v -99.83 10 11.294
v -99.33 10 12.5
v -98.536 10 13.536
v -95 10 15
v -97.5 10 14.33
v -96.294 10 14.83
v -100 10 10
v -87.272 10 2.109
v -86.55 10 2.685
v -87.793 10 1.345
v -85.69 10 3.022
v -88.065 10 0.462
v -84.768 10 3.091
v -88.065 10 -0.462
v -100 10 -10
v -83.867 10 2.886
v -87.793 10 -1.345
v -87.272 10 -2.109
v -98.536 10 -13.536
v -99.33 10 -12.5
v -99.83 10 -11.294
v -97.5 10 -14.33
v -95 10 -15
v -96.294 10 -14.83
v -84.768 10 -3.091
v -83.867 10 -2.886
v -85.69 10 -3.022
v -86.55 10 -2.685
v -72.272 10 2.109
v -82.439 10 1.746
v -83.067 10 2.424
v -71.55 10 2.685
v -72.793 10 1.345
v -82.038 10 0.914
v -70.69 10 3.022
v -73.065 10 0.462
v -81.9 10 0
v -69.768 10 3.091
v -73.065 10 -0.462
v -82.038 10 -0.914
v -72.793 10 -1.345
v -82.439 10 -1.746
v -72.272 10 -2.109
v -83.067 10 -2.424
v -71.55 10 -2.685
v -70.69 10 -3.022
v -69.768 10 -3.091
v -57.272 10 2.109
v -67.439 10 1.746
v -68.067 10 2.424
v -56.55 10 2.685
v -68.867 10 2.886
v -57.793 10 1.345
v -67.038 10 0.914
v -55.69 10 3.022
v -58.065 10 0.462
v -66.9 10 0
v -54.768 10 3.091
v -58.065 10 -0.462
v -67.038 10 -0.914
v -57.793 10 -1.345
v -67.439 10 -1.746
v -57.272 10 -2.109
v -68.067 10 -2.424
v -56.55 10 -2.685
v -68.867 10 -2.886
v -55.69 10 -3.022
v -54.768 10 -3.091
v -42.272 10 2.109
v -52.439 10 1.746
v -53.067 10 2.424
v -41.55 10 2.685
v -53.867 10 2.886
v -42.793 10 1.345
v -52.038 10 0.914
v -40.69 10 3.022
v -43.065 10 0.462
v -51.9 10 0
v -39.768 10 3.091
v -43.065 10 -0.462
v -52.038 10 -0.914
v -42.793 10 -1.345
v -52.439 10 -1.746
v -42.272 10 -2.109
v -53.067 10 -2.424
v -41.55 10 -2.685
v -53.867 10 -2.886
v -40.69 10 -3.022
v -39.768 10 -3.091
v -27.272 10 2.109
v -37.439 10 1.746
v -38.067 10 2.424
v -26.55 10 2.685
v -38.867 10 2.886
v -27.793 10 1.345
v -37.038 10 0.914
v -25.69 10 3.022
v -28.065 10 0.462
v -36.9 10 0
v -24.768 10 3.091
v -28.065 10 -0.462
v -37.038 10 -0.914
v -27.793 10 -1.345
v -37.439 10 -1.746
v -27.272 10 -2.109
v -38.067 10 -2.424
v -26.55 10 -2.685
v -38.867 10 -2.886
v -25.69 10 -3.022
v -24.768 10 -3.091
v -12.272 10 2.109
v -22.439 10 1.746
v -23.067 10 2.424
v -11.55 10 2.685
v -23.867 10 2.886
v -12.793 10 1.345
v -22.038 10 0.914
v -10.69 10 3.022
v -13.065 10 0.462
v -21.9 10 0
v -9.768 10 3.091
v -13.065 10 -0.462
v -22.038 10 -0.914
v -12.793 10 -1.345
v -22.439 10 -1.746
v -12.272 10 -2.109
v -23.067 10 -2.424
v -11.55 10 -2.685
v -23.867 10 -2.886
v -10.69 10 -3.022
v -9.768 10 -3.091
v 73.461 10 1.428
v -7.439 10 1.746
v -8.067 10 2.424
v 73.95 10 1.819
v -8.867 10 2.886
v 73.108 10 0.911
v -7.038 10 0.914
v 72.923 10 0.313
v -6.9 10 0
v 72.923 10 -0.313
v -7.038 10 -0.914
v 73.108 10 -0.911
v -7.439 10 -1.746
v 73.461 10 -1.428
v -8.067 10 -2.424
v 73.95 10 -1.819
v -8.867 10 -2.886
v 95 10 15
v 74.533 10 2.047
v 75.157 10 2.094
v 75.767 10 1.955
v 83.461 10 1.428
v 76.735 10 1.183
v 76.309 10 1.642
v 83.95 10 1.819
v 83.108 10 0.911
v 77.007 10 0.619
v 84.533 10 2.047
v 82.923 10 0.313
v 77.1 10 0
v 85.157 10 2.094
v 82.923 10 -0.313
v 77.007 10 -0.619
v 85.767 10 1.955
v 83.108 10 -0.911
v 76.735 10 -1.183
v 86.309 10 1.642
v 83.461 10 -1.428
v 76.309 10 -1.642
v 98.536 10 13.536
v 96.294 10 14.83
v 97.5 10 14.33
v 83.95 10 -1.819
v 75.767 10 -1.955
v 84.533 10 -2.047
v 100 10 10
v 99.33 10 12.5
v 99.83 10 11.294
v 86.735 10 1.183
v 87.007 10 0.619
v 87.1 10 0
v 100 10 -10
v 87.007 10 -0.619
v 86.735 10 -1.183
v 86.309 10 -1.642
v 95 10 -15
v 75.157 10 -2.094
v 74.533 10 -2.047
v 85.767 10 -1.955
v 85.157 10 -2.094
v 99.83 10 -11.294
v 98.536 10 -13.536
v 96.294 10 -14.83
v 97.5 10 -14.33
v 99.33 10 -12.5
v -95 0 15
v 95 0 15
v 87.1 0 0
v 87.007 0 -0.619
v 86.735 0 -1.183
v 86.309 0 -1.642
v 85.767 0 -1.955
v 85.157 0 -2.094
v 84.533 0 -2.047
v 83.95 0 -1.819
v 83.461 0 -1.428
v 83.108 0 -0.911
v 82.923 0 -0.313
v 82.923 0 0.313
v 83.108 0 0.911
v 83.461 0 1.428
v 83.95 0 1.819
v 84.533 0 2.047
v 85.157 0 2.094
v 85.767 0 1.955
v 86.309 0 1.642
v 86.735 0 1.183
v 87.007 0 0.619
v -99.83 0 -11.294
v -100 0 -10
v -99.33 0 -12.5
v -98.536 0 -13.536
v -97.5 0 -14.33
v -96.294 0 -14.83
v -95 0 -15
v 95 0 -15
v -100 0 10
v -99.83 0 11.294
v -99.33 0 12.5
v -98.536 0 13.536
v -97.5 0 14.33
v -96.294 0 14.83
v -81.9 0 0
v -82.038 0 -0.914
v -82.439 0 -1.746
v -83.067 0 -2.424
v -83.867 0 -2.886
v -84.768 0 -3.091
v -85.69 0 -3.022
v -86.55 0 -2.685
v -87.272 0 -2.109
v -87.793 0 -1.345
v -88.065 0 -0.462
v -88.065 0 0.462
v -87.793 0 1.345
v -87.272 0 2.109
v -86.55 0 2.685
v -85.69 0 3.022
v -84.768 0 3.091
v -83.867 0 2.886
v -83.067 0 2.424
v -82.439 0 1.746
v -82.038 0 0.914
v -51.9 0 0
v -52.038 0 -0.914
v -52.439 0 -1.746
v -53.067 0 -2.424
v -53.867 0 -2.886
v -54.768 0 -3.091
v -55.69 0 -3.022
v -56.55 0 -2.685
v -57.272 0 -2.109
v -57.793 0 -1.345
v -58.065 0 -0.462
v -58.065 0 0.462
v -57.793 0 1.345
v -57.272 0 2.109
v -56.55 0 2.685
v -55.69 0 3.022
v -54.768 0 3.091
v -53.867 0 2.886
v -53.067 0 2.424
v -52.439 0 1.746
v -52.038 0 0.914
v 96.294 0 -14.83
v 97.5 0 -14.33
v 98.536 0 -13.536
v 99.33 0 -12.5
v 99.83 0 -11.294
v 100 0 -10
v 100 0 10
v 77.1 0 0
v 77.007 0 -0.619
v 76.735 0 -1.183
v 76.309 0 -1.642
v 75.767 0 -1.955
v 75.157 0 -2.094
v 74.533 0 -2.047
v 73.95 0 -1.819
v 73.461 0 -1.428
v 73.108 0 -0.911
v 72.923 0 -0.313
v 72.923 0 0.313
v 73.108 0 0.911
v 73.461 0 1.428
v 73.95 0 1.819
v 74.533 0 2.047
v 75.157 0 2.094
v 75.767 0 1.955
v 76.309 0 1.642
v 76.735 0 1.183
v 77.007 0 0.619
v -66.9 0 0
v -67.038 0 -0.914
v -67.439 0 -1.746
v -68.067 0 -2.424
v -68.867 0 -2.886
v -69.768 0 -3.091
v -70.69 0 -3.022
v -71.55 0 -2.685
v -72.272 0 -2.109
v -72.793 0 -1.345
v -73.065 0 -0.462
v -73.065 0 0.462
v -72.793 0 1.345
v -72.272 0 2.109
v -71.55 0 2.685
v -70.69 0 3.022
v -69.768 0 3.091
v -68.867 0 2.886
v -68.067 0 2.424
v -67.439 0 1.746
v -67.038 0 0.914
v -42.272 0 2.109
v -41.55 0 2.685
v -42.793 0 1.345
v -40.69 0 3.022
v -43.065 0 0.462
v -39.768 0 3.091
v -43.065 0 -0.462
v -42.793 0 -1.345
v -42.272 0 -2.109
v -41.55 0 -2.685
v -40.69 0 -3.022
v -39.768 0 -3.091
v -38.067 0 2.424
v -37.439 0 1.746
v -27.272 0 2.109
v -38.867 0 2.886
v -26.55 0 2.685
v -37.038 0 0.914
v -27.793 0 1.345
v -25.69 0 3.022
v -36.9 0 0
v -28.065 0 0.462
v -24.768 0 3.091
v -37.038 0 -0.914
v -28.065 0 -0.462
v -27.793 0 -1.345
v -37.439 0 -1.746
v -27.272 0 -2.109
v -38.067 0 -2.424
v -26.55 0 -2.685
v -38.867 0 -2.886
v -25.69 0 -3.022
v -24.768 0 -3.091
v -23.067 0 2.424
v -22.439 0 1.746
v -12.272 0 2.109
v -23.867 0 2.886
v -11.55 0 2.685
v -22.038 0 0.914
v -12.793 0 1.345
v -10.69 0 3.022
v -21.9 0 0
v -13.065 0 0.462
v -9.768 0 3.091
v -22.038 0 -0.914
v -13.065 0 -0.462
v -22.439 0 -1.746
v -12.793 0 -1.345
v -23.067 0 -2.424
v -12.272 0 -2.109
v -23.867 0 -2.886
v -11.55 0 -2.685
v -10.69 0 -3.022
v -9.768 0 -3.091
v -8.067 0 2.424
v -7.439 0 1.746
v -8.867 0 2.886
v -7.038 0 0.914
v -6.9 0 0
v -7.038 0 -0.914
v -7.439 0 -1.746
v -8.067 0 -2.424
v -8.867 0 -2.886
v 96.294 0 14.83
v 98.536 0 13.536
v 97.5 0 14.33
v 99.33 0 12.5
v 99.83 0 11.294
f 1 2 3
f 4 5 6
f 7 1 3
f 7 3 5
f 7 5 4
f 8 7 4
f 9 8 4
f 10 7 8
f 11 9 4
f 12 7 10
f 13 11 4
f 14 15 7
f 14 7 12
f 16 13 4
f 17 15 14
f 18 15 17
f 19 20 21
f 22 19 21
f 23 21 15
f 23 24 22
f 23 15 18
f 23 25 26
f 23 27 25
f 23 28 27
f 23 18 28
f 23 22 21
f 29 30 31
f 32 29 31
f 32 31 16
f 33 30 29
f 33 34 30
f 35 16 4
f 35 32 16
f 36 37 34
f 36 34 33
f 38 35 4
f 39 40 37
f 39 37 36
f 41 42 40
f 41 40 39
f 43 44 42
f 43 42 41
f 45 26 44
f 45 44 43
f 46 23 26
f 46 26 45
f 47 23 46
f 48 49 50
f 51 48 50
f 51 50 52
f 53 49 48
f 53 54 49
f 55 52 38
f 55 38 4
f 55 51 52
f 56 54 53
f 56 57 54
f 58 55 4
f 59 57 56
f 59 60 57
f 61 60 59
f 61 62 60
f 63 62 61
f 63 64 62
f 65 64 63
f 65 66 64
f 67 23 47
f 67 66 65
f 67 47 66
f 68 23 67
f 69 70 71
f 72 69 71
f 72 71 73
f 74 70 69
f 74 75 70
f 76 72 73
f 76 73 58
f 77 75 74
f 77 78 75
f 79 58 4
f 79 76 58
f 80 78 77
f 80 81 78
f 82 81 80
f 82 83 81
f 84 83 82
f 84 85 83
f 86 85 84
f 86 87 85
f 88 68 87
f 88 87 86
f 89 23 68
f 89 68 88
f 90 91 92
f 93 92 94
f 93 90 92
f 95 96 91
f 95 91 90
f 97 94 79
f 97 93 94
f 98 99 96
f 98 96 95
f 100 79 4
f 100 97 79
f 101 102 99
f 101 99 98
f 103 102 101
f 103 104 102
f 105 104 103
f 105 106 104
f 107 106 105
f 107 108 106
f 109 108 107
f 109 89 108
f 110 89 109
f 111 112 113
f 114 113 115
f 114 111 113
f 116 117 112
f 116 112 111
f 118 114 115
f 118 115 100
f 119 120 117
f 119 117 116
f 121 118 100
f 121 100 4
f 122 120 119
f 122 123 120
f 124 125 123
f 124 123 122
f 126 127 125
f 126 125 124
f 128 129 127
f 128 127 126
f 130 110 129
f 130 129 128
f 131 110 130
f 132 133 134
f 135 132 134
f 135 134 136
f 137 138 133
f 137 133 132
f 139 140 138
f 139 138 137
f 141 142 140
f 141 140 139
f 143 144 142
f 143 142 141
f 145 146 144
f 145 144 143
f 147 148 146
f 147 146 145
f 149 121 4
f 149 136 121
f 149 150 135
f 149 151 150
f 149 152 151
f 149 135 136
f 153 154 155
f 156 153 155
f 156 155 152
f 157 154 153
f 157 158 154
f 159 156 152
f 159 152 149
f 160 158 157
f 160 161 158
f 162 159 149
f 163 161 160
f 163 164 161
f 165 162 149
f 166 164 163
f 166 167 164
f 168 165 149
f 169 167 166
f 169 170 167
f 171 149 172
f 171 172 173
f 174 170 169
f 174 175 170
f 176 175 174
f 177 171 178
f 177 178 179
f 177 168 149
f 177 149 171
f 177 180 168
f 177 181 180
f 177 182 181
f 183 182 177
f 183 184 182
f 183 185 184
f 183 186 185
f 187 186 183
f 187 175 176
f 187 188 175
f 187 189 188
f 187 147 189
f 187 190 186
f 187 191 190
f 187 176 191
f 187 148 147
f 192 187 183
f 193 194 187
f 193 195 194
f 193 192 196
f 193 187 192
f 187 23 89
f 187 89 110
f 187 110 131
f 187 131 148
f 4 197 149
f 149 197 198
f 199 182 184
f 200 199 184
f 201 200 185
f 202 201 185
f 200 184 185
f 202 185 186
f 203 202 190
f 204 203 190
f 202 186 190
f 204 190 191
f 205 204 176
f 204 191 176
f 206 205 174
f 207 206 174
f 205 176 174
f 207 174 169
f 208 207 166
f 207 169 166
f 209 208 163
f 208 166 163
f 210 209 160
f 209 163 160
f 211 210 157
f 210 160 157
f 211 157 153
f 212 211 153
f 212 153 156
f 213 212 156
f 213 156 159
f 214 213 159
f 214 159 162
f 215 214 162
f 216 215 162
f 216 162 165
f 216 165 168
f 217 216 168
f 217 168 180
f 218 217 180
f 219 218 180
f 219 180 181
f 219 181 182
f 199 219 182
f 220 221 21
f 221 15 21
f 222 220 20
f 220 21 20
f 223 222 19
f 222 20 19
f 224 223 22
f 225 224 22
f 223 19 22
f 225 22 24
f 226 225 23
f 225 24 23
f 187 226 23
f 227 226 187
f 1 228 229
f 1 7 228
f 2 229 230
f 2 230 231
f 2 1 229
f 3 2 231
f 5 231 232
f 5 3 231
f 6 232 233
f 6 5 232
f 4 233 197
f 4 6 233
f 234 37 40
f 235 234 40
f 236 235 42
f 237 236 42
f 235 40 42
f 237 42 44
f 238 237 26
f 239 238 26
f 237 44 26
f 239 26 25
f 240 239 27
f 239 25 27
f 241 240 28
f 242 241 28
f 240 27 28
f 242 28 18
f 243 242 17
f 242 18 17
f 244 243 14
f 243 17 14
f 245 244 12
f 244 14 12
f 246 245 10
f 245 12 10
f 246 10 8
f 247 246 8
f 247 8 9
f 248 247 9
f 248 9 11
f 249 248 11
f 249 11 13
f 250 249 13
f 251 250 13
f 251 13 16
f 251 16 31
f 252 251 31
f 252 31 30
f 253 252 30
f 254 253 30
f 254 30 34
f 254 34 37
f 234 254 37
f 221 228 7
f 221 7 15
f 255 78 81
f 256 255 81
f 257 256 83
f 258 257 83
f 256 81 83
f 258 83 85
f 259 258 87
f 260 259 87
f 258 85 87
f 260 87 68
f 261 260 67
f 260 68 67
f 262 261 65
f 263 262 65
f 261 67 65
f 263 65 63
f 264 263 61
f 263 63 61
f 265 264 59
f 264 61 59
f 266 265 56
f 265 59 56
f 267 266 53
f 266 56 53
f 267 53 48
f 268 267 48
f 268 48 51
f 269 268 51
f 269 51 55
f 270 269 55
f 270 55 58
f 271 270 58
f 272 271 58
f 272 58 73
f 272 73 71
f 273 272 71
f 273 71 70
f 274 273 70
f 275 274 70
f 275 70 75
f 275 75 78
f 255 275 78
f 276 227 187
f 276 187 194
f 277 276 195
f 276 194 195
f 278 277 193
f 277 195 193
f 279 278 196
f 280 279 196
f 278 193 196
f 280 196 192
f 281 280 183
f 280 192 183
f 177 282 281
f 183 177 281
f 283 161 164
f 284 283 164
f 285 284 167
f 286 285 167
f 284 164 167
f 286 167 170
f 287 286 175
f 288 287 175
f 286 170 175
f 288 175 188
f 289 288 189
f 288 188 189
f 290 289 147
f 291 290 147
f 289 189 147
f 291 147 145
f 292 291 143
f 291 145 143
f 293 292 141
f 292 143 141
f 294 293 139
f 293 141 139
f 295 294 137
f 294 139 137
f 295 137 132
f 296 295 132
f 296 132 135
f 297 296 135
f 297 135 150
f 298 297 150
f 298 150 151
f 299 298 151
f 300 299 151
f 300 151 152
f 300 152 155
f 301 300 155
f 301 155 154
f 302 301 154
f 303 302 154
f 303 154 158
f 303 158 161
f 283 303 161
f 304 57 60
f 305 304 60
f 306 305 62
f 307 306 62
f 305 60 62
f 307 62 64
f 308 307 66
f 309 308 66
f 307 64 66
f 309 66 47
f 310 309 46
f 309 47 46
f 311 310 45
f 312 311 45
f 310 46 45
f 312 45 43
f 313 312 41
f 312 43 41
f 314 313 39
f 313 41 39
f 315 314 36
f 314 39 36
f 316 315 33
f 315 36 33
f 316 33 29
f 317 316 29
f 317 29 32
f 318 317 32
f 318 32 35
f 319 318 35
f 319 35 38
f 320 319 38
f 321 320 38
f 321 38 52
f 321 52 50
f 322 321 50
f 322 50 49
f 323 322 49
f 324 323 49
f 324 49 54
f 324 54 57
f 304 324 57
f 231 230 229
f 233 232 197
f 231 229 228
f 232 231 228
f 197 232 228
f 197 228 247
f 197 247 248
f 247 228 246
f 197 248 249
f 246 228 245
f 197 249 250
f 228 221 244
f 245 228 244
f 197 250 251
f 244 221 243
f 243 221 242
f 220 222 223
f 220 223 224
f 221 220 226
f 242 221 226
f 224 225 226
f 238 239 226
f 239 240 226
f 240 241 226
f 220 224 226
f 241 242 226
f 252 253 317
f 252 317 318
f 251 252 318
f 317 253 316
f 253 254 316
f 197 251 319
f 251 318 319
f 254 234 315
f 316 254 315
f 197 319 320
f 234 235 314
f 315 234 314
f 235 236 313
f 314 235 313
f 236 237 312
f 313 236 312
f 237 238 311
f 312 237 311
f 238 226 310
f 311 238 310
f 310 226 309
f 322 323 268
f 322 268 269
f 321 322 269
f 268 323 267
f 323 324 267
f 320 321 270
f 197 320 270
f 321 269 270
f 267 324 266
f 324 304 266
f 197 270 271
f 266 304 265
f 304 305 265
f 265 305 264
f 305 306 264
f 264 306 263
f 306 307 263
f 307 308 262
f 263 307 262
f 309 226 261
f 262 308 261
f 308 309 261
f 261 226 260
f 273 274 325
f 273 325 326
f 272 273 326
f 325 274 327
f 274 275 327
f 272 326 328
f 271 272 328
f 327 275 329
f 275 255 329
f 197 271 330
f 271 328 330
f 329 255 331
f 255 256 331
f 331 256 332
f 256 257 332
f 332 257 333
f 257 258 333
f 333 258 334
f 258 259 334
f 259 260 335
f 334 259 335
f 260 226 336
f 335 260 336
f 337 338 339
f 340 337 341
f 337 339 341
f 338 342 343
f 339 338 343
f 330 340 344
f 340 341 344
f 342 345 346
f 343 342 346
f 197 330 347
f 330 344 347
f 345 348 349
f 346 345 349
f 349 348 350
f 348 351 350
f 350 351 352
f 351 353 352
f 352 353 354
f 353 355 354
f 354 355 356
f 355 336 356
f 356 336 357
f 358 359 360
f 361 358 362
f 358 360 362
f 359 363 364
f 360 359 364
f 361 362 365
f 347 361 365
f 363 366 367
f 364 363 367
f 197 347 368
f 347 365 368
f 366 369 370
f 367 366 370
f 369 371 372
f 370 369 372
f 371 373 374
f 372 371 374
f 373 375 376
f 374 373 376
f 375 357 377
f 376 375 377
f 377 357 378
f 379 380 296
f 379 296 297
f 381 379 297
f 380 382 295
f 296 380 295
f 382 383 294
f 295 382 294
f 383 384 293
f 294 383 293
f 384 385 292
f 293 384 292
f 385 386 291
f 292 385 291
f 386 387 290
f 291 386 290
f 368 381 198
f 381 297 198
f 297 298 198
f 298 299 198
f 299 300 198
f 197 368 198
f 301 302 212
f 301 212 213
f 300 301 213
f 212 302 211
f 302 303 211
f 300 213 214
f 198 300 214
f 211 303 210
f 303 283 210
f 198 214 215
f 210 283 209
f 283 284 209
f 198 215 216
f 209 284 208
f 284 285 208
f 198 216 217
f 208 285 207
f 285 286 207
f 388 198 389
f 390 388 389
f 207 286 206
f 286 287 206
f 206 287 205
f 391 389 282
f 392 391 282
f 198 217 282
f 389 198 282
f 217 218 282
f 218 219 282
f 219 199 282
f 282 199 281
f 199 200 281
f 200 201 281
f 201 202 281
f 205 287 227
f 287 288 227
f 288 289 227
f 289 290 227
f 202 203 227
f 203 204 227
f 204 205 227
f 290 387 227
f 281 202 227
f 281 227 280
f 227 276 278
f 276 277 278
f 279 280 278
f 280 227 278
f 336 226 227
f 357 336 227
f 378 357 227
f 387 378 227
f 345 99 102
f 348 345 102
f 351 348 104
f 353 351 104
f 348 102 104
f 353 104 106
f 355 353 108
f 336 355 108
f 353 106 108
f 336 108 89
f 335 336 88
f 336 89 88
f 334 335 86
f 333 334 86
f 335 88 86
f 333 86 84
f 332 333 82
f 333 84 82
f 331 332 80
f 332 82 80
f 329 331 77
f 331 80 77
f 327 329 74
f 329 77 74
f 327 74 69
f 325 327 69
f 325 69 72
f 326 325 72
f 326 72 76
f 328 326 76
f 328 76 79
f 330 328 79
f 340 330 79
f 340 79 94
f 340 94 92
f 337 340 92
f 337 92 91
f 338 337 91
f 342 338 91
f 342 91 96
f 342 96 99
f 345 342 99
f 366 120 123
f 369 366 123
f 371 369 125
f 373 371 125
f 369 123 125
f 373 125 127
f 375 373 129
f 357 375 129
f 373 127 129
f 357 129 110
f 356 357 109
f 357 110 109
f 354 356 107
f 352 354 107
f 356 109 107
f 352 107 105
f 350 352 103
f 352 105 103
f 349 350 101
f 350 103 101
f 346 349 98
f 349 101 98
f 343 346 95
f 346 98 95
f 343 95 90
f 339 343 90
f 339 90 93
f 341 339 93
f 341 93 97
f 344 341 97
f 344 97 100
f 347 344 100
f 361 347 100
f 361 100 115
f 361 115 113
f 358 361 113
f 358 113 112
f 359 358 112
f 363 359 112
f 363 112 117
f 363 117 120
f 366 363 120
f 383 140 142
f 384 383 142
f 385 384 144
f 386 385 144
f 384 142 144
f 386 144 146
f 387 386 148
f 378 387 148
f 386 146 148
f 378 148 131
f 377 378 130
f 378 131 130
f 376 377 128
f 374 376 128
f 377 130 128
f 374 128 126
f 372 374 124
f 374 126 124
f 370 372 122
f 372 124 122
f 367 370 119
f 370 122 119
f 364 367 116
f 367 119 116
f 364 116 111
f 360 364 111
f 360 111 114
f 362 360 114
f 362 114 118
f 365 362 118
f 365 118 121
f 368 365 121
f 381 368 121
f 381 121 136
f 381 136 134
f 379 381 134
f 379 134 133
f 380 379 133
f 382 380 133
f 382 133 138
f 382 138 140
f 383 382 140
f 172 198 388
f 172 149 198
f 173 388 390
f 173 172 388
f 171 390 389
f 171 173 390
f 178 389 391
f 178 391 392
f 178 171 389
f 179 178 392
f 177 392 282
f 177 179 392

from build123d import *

# Parameters (mm, degrees)
SKETCH1_W           = 200
SKETCH1_H           = 30
BOSS_EXTRUDE1_DEPTH = 10
SKETCH2_R           = 2.1
CUT_EXTRUDE1_DEPTH  = 11
SKETCH3_R           = 3.1
CUT_EXTRUDE2_DEPTH  = 11
LPATTERN1_COUNT     = 6
LPATTERN1_PITCH     = 15
FILLET1_R           = 5


with BuildPart() as part:
    # Sketch1 → Boss-Extrude1 (new body)
    with BuildSketch(Plane(origin=(0, 0, 0), x_dir=(1, 0, 0), z_dir=(0, 1, 0))):
        Rectangle(SKETCH1_W, SKETCH1_H)
    extrude(amount=BOSS_EXTRUDE1_DEPTH)

    # Sketch2 → Cut-Extrude1 (cut, through all)
    with BuildSketch(Plane(origin=(0, 10, 0), x_dir=(1, 0, 0), z_dir=(0, 1, 0))):
        with Locations((85, 0)):
            Circle(SKETCH2_R)
        with Locations((75, 0)):
            Circle(SKETCH2_R)
    extrude(amount=-CUT_EXTRUDE1_DEPTH, mode=Mode.SUBTRACT)

    # Sketch3 → Cut-Extrude2 (cut, through all)
    with BuildSketch(Plane(origin=(0, 10, 0), x_dir=(1, 0, 0), z_dir=(0, 1, 0))):
        with Locations((-85, 0)):
            Circle(SKETCH3_R)
    cut_extrude2 = extrude(amount=-CUT_EXTRUDE2_DEPTH, mode=Mode.SUBTRACT)

    # LPattern1: Cut-Extrude2 ×6
    with Locations(*[(i * LPATTERN1_PITCH, 0, 0) for i in range(1, LPATTERN1_COUNT)]):
        add(cut_extrude2, mode=Mode.SUBTRACT)

    # Fillet1
    fillet1_edges = [part.edges().sort_by_distance(p)[0] for p in [
        (-100, 5, -15),
        (100, 5, -15),
        (100, 5, 15),
        (-100, 5, 15),
    ]]
    fillet(fillet1_edges, radius=FILLET1_R)


solid = part.part
